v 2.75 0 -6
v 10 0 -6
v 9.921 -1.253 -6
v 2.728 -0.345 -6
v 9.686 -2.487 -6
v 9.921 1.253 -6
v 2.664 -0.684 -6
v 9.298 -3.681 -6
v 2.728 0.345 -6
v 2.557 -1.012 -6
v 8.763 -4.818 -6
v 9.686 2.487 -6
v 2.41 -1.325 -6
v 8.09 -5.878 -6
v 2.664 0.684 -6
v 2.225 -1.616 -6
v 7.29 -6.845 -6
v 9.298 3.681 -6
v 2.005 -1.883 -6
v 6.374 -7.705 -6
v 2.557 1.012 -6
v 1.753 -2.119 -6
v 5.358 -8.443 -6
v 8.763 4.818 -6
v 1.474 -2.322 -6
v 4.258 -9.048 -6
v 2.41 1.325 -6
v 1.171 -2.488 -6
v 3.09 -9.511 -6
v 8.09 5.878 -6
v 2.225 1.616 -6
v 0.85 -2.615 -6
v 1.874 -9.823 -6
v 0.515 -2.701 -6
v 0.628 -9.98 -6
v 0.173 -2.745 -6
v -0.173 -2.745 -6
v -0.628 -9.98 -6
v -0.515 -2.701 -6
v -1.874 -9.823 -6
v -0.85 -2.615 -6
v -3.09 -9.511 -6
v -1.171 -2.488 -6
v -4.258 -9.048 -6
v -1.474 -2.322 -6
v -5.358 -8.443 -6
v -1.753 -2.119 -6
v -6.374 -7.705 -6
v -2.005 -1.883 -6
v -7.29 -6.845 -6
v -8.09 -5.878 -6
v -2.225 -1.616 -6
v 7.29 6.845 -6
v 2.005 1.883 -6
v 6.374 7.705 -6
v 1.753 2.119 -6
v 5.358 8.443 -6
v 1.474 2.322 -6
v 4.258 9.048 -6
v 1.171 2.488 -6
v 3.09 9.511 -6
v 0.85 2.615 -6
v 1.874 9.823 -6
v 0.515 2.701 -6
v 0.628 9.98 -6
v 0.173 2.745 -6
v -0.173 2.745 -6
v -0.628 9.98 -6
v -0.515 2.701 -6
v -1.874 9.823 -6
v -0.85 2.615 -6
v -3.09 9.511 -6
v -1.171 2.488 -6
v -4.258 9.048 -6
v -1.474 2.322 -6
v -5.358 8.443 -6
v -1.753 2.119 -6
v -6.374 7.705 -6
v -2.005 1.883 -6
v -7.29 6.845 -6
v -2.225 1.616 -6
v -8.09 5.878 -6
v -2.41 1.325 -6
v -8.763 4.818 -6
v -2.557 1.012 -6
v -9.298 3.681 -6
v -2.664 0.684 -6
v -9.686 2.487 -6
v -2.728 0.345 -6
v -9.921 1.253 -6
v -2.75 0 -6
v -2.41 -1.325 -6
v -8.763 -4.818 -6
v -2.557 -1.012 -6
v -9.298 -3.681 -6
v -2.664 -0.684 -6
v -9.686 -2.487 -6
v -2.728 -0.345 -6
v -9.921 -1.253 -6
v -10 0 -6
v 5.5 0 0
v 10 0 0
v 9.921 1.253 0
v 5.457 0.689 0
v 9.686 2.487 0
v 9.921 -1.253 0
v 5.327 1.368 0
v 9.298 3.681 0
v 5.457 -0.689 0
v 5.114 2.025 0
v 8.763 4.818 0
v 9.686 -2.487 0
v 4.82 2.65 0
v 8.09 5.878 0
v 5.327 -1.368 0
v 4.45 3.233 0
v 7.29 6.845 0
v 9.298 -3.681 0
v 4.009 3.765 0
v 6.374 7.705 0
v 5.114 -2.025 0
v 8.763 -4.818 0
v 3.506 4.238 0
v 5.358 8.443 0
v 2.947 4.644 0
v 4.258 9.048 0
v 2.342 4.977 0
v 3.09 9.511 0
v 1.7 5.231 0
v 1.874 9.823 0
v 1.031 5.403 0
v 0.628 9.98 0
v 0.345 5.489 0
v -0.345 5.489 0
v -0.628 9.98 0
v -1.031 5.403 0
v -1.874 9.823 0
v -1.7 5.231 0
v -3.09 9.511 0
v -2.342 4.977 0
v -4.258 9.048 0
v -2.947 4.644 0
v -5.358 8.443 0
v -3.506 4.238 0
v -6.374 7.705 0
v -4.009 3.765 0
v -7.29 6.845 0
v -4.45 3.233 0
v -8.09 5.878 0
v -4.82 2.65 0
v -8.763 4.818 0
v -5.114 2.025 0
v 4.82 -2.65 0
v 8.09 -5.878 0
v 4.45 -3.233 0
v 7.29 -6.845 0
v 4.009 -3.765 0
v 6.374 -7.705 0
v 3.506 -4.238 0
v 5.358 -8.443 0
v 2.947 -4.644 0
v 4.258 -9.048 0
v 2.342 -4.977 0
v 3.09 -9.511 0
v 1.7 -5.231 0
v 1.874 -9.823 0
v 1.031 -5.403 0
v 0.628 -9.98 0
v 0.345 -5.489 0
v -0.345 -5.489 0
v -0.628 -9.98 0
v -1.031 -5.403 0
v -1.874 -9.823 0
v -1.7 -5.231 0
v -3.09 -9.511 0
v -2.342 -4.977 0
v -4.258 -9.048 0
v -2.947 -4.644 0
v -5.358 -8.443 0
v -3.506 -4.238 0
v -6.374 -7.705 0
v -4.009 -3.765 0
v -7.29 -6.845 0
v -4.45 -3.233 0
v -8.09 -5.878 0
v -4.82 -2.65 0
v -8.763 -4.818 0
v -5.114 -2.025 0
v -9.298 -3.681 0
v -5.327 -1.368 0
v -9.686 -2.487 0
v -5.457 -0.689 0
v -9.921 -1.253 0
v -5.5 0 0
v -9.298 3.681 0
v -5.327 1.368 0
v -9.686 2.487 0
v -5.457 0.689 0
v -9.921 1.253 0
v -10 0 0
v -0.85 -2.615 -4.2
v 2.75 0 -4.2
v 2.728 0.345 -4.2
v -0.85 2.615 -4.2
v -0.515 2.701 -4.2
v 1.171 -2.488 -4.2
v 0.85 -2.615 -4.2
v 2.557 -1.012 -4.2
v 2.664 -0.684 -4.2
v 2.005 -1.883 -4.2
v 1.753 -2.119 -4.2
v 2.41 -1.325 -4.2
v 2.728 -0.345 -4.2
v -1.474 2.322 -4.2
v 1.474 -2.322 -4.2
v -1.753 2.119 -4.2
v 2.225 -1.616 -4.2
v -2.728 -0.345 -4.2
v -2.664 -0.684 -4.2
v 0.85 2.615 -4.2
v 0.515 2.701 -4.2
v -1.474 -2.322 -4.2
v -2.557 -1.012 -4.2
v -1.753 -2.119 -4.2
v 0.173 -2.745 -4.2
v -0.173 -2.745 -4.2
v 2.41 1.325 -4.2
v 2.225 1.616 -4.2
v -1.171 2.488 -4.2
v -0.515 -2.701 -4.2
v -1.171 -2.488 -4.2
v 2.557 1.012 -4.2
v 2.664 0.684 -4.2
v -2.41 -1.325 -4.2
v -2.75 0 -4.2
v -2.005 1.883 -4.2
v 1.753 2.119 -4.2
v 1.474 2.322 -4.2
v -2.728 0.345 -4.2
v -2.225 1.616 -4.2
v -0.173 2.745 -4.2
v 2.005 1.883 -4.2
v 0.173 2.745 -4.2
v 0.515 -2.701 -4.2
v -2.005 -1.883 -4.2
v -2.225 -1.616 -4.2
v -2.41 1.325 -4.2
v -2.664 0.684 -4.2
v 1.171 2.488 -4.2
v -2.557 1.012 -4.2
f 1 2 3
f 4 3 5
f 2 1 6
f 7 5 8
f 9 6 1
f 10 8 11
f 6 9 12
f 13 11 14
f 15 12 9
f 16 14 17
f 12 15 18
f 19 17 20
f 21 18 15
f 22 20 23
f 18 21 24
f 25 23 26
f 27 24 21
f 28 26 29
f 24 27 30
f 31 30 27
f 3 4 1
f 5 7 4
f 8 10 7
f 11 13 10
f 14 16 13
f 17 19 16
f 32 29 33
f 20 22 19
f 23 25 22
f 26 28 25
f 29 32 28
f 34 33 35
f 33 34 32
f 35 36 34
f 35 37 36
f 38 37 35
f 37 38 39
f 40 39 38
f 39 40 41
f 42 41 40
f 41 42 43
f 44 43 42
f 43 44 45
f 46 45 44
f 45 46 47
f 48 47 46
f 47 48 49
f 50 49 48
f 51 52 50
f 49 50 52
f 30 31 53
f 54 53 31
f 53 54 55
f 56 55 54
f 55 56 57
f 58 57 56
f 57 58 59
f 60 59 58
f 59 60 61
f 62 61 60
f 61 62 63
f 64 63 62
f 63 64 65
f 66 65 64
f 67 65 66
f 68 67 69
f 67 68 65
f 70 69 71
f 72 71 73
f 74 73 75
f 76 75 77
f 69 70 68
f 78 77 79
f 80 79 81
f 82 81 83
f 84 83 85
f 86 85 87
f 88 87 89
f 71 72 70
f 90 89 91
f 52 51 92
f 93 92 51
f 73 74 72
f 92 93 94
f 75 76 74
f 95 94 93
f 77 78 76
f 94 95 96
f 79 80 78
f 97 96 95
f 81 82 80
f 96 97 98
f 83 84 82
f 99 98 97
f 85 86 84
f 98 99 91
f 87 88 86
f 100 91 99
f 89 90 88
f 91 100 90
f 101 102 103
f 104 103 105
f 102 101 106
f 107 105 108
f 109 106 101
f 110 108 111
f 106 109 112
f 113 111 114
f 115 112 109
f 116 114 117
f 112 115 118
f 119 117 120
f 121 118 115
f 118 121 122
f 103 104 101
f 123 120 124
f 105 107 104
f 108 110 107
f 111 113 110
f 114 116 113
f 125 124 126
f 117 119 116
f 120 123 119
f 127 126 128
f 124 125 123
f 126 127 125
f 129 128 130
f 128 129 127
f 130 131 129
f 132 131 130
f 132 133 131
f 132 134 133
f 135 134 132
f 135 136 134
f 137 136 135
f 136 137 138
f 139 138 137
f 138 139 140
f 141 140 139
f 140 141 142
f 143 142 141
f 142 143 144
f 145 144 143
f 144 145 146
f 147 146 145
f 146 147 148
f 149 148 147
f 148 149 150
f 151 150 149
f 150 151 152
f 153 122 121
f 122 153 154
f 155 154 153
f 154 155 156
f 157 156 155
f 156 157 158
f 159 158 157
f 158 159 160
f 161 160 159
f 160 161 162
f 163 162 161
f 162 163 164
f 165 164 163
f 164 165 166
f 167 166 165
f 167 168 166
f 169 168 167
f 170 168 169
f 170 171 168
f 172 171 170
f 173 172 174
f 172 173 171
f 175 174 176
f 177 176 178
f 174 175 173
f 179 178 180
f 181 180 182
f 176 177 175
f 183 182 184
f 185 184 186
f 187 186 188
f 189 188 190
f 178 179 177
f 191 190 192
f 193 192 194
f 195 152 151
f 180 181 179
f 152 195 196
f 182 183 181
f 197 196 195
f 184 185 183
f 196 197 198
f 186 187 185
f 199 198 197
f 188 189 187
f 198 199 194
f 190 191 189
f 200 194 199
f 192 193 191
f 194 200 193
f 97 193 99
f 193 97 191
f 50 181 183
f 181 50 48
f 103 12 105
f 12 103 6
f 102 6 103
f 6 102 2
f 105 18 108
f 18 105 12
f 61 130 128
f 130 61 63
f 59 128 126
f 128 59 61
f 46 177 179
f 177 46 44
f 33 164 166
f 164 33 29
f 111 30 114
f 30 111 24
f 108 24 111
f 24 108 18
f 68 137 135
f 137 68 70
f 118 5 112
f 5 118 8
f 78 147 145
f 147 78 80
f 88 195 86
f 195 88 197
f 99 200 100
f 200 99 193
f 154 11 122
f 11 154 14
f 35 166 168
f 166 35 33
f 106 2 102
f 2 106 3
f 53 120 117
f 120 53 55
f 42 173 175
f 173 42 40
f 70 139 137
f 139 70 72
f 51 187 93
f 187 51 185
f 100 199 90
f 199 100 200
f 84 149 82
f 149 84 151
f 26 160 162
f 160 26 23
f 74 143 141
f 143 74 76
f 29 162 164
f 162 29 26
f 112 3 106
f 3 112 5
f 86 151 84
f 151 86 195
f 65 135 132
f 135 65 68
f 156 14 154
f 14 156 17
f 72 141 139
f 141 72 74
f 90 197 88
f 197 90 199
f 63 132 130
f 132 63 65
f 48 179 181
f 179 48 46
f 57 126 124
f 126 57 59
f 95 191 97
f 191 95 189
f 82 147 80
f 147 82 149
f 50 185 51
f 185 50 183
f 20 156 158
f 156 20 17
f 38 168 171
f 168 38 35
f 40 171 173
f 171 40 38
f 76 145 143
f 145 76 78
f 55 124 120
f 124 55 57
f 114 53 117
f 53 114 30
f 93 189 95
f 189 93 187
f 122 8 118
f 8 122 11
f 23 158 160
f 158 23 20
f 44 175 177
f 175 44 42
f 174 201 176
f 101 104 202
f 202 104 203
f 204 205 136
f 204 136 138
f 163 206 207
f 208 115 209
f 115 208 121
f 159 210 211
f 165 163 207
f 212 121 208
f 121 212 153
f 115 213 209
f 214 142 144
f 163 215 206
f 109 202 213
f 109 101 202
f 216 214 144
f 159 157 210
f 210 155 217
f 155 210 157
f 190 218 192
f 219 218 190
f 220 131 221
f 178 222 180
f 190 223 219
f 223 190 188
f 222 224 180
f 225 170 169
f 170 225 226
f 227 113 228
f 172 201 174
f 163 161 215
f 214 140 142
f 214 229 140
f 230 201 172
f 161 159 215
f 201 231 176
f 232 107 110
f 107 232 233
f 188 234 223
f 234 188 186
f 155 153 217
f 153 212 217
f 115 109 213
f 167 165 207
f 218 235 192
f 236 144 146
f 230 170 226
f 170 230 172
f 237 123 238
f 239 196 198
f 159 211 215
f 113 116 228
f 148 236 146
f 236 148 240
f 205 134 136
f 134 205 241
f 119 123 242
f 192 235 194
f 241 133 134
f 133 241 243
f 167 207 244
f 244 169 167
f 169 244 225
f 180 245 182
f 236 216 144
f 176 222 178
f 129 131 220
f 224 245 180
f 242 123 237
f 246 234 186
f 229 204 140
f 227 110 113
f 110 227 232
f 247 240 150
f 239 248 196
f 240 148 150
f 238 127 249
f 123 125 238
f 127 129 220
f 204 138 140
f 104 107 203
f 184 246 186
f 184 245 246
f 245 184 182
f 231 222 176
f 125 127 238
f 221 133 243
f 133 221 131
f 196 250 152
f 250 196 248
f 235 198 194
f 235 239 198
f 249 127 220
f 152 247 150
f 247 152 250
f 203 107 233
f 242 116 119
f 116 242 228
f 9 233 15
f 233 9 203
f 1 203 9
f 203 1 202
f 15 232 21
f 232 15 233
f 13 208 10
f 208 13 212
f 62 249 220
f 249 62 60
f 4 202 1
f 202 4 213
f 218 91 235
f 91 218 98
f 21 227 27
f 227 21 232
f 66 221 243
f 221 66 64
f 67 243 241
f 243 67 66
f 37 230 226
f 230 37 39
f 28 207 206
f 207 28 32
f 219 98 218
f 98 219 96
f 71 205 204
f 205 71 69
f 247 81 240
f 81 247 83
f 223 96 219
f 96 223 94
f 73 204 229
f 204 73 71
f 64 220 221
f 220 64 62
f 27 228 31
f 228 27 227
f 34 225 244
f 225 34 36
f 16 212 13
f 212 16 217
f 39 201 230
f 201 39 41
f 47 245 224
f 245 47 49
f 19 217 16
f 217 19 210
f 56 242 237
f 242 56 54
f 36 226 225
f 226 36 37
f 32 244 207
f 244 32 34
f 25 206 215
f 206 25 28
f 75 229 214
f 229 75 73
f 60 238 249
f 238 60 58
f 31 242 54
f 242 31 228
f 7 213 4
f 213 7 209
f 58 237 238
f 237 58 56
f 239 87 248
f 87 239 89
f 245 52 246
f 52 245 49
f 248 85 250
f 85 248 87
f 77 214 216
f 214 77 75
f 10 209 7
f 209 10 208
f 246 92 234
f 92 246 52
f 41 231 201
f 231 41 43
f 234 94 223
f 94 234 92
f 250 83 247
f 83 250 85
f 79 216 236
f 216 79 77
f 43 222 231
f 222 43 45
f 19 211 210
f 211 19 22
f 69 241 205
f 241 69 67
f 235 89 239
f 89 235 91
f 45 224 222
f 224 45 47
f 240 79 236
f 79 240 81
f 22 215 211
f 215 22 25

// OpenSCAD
$fn = 50;


difference() {
	union() {
		translate(v = [0, 0, -6.0000000000]) {
			cylinder(h = 6, r = 7.0000000000);
		}
		translate(v = [0, 0, -6.0000000000]) {
			cylinder(h = 6, r = 10.0000000000);
		}
	}
	union() {
		translate(v = [0, 0, 0]) {
			rotate(a = [0, 0, 0]) {
				difference() {
					union() {
						#translate(v = [0, 0, -6.0000000000]) {
							cylinder(h = 6, r = 2.2500000000);
						}
						#translate(v = [0, 0, -4.2000000000]) {
							cylinder(h = 4.2000000000, r = 7.0000000000, r1 = 2.7500000000, r2 = 5.5000000000);
						}
						#translate(v = [0, 0, -6.0000000000]) {
							cylinder(h = 6, r = 2.7500000000);
						}
						#translate(v = [0, 0, -6.0000000000]) {
							cylinder(h = 6, r = 2.2500000000);
						}
					}
					union();
				}
			}
		}
	}
}
